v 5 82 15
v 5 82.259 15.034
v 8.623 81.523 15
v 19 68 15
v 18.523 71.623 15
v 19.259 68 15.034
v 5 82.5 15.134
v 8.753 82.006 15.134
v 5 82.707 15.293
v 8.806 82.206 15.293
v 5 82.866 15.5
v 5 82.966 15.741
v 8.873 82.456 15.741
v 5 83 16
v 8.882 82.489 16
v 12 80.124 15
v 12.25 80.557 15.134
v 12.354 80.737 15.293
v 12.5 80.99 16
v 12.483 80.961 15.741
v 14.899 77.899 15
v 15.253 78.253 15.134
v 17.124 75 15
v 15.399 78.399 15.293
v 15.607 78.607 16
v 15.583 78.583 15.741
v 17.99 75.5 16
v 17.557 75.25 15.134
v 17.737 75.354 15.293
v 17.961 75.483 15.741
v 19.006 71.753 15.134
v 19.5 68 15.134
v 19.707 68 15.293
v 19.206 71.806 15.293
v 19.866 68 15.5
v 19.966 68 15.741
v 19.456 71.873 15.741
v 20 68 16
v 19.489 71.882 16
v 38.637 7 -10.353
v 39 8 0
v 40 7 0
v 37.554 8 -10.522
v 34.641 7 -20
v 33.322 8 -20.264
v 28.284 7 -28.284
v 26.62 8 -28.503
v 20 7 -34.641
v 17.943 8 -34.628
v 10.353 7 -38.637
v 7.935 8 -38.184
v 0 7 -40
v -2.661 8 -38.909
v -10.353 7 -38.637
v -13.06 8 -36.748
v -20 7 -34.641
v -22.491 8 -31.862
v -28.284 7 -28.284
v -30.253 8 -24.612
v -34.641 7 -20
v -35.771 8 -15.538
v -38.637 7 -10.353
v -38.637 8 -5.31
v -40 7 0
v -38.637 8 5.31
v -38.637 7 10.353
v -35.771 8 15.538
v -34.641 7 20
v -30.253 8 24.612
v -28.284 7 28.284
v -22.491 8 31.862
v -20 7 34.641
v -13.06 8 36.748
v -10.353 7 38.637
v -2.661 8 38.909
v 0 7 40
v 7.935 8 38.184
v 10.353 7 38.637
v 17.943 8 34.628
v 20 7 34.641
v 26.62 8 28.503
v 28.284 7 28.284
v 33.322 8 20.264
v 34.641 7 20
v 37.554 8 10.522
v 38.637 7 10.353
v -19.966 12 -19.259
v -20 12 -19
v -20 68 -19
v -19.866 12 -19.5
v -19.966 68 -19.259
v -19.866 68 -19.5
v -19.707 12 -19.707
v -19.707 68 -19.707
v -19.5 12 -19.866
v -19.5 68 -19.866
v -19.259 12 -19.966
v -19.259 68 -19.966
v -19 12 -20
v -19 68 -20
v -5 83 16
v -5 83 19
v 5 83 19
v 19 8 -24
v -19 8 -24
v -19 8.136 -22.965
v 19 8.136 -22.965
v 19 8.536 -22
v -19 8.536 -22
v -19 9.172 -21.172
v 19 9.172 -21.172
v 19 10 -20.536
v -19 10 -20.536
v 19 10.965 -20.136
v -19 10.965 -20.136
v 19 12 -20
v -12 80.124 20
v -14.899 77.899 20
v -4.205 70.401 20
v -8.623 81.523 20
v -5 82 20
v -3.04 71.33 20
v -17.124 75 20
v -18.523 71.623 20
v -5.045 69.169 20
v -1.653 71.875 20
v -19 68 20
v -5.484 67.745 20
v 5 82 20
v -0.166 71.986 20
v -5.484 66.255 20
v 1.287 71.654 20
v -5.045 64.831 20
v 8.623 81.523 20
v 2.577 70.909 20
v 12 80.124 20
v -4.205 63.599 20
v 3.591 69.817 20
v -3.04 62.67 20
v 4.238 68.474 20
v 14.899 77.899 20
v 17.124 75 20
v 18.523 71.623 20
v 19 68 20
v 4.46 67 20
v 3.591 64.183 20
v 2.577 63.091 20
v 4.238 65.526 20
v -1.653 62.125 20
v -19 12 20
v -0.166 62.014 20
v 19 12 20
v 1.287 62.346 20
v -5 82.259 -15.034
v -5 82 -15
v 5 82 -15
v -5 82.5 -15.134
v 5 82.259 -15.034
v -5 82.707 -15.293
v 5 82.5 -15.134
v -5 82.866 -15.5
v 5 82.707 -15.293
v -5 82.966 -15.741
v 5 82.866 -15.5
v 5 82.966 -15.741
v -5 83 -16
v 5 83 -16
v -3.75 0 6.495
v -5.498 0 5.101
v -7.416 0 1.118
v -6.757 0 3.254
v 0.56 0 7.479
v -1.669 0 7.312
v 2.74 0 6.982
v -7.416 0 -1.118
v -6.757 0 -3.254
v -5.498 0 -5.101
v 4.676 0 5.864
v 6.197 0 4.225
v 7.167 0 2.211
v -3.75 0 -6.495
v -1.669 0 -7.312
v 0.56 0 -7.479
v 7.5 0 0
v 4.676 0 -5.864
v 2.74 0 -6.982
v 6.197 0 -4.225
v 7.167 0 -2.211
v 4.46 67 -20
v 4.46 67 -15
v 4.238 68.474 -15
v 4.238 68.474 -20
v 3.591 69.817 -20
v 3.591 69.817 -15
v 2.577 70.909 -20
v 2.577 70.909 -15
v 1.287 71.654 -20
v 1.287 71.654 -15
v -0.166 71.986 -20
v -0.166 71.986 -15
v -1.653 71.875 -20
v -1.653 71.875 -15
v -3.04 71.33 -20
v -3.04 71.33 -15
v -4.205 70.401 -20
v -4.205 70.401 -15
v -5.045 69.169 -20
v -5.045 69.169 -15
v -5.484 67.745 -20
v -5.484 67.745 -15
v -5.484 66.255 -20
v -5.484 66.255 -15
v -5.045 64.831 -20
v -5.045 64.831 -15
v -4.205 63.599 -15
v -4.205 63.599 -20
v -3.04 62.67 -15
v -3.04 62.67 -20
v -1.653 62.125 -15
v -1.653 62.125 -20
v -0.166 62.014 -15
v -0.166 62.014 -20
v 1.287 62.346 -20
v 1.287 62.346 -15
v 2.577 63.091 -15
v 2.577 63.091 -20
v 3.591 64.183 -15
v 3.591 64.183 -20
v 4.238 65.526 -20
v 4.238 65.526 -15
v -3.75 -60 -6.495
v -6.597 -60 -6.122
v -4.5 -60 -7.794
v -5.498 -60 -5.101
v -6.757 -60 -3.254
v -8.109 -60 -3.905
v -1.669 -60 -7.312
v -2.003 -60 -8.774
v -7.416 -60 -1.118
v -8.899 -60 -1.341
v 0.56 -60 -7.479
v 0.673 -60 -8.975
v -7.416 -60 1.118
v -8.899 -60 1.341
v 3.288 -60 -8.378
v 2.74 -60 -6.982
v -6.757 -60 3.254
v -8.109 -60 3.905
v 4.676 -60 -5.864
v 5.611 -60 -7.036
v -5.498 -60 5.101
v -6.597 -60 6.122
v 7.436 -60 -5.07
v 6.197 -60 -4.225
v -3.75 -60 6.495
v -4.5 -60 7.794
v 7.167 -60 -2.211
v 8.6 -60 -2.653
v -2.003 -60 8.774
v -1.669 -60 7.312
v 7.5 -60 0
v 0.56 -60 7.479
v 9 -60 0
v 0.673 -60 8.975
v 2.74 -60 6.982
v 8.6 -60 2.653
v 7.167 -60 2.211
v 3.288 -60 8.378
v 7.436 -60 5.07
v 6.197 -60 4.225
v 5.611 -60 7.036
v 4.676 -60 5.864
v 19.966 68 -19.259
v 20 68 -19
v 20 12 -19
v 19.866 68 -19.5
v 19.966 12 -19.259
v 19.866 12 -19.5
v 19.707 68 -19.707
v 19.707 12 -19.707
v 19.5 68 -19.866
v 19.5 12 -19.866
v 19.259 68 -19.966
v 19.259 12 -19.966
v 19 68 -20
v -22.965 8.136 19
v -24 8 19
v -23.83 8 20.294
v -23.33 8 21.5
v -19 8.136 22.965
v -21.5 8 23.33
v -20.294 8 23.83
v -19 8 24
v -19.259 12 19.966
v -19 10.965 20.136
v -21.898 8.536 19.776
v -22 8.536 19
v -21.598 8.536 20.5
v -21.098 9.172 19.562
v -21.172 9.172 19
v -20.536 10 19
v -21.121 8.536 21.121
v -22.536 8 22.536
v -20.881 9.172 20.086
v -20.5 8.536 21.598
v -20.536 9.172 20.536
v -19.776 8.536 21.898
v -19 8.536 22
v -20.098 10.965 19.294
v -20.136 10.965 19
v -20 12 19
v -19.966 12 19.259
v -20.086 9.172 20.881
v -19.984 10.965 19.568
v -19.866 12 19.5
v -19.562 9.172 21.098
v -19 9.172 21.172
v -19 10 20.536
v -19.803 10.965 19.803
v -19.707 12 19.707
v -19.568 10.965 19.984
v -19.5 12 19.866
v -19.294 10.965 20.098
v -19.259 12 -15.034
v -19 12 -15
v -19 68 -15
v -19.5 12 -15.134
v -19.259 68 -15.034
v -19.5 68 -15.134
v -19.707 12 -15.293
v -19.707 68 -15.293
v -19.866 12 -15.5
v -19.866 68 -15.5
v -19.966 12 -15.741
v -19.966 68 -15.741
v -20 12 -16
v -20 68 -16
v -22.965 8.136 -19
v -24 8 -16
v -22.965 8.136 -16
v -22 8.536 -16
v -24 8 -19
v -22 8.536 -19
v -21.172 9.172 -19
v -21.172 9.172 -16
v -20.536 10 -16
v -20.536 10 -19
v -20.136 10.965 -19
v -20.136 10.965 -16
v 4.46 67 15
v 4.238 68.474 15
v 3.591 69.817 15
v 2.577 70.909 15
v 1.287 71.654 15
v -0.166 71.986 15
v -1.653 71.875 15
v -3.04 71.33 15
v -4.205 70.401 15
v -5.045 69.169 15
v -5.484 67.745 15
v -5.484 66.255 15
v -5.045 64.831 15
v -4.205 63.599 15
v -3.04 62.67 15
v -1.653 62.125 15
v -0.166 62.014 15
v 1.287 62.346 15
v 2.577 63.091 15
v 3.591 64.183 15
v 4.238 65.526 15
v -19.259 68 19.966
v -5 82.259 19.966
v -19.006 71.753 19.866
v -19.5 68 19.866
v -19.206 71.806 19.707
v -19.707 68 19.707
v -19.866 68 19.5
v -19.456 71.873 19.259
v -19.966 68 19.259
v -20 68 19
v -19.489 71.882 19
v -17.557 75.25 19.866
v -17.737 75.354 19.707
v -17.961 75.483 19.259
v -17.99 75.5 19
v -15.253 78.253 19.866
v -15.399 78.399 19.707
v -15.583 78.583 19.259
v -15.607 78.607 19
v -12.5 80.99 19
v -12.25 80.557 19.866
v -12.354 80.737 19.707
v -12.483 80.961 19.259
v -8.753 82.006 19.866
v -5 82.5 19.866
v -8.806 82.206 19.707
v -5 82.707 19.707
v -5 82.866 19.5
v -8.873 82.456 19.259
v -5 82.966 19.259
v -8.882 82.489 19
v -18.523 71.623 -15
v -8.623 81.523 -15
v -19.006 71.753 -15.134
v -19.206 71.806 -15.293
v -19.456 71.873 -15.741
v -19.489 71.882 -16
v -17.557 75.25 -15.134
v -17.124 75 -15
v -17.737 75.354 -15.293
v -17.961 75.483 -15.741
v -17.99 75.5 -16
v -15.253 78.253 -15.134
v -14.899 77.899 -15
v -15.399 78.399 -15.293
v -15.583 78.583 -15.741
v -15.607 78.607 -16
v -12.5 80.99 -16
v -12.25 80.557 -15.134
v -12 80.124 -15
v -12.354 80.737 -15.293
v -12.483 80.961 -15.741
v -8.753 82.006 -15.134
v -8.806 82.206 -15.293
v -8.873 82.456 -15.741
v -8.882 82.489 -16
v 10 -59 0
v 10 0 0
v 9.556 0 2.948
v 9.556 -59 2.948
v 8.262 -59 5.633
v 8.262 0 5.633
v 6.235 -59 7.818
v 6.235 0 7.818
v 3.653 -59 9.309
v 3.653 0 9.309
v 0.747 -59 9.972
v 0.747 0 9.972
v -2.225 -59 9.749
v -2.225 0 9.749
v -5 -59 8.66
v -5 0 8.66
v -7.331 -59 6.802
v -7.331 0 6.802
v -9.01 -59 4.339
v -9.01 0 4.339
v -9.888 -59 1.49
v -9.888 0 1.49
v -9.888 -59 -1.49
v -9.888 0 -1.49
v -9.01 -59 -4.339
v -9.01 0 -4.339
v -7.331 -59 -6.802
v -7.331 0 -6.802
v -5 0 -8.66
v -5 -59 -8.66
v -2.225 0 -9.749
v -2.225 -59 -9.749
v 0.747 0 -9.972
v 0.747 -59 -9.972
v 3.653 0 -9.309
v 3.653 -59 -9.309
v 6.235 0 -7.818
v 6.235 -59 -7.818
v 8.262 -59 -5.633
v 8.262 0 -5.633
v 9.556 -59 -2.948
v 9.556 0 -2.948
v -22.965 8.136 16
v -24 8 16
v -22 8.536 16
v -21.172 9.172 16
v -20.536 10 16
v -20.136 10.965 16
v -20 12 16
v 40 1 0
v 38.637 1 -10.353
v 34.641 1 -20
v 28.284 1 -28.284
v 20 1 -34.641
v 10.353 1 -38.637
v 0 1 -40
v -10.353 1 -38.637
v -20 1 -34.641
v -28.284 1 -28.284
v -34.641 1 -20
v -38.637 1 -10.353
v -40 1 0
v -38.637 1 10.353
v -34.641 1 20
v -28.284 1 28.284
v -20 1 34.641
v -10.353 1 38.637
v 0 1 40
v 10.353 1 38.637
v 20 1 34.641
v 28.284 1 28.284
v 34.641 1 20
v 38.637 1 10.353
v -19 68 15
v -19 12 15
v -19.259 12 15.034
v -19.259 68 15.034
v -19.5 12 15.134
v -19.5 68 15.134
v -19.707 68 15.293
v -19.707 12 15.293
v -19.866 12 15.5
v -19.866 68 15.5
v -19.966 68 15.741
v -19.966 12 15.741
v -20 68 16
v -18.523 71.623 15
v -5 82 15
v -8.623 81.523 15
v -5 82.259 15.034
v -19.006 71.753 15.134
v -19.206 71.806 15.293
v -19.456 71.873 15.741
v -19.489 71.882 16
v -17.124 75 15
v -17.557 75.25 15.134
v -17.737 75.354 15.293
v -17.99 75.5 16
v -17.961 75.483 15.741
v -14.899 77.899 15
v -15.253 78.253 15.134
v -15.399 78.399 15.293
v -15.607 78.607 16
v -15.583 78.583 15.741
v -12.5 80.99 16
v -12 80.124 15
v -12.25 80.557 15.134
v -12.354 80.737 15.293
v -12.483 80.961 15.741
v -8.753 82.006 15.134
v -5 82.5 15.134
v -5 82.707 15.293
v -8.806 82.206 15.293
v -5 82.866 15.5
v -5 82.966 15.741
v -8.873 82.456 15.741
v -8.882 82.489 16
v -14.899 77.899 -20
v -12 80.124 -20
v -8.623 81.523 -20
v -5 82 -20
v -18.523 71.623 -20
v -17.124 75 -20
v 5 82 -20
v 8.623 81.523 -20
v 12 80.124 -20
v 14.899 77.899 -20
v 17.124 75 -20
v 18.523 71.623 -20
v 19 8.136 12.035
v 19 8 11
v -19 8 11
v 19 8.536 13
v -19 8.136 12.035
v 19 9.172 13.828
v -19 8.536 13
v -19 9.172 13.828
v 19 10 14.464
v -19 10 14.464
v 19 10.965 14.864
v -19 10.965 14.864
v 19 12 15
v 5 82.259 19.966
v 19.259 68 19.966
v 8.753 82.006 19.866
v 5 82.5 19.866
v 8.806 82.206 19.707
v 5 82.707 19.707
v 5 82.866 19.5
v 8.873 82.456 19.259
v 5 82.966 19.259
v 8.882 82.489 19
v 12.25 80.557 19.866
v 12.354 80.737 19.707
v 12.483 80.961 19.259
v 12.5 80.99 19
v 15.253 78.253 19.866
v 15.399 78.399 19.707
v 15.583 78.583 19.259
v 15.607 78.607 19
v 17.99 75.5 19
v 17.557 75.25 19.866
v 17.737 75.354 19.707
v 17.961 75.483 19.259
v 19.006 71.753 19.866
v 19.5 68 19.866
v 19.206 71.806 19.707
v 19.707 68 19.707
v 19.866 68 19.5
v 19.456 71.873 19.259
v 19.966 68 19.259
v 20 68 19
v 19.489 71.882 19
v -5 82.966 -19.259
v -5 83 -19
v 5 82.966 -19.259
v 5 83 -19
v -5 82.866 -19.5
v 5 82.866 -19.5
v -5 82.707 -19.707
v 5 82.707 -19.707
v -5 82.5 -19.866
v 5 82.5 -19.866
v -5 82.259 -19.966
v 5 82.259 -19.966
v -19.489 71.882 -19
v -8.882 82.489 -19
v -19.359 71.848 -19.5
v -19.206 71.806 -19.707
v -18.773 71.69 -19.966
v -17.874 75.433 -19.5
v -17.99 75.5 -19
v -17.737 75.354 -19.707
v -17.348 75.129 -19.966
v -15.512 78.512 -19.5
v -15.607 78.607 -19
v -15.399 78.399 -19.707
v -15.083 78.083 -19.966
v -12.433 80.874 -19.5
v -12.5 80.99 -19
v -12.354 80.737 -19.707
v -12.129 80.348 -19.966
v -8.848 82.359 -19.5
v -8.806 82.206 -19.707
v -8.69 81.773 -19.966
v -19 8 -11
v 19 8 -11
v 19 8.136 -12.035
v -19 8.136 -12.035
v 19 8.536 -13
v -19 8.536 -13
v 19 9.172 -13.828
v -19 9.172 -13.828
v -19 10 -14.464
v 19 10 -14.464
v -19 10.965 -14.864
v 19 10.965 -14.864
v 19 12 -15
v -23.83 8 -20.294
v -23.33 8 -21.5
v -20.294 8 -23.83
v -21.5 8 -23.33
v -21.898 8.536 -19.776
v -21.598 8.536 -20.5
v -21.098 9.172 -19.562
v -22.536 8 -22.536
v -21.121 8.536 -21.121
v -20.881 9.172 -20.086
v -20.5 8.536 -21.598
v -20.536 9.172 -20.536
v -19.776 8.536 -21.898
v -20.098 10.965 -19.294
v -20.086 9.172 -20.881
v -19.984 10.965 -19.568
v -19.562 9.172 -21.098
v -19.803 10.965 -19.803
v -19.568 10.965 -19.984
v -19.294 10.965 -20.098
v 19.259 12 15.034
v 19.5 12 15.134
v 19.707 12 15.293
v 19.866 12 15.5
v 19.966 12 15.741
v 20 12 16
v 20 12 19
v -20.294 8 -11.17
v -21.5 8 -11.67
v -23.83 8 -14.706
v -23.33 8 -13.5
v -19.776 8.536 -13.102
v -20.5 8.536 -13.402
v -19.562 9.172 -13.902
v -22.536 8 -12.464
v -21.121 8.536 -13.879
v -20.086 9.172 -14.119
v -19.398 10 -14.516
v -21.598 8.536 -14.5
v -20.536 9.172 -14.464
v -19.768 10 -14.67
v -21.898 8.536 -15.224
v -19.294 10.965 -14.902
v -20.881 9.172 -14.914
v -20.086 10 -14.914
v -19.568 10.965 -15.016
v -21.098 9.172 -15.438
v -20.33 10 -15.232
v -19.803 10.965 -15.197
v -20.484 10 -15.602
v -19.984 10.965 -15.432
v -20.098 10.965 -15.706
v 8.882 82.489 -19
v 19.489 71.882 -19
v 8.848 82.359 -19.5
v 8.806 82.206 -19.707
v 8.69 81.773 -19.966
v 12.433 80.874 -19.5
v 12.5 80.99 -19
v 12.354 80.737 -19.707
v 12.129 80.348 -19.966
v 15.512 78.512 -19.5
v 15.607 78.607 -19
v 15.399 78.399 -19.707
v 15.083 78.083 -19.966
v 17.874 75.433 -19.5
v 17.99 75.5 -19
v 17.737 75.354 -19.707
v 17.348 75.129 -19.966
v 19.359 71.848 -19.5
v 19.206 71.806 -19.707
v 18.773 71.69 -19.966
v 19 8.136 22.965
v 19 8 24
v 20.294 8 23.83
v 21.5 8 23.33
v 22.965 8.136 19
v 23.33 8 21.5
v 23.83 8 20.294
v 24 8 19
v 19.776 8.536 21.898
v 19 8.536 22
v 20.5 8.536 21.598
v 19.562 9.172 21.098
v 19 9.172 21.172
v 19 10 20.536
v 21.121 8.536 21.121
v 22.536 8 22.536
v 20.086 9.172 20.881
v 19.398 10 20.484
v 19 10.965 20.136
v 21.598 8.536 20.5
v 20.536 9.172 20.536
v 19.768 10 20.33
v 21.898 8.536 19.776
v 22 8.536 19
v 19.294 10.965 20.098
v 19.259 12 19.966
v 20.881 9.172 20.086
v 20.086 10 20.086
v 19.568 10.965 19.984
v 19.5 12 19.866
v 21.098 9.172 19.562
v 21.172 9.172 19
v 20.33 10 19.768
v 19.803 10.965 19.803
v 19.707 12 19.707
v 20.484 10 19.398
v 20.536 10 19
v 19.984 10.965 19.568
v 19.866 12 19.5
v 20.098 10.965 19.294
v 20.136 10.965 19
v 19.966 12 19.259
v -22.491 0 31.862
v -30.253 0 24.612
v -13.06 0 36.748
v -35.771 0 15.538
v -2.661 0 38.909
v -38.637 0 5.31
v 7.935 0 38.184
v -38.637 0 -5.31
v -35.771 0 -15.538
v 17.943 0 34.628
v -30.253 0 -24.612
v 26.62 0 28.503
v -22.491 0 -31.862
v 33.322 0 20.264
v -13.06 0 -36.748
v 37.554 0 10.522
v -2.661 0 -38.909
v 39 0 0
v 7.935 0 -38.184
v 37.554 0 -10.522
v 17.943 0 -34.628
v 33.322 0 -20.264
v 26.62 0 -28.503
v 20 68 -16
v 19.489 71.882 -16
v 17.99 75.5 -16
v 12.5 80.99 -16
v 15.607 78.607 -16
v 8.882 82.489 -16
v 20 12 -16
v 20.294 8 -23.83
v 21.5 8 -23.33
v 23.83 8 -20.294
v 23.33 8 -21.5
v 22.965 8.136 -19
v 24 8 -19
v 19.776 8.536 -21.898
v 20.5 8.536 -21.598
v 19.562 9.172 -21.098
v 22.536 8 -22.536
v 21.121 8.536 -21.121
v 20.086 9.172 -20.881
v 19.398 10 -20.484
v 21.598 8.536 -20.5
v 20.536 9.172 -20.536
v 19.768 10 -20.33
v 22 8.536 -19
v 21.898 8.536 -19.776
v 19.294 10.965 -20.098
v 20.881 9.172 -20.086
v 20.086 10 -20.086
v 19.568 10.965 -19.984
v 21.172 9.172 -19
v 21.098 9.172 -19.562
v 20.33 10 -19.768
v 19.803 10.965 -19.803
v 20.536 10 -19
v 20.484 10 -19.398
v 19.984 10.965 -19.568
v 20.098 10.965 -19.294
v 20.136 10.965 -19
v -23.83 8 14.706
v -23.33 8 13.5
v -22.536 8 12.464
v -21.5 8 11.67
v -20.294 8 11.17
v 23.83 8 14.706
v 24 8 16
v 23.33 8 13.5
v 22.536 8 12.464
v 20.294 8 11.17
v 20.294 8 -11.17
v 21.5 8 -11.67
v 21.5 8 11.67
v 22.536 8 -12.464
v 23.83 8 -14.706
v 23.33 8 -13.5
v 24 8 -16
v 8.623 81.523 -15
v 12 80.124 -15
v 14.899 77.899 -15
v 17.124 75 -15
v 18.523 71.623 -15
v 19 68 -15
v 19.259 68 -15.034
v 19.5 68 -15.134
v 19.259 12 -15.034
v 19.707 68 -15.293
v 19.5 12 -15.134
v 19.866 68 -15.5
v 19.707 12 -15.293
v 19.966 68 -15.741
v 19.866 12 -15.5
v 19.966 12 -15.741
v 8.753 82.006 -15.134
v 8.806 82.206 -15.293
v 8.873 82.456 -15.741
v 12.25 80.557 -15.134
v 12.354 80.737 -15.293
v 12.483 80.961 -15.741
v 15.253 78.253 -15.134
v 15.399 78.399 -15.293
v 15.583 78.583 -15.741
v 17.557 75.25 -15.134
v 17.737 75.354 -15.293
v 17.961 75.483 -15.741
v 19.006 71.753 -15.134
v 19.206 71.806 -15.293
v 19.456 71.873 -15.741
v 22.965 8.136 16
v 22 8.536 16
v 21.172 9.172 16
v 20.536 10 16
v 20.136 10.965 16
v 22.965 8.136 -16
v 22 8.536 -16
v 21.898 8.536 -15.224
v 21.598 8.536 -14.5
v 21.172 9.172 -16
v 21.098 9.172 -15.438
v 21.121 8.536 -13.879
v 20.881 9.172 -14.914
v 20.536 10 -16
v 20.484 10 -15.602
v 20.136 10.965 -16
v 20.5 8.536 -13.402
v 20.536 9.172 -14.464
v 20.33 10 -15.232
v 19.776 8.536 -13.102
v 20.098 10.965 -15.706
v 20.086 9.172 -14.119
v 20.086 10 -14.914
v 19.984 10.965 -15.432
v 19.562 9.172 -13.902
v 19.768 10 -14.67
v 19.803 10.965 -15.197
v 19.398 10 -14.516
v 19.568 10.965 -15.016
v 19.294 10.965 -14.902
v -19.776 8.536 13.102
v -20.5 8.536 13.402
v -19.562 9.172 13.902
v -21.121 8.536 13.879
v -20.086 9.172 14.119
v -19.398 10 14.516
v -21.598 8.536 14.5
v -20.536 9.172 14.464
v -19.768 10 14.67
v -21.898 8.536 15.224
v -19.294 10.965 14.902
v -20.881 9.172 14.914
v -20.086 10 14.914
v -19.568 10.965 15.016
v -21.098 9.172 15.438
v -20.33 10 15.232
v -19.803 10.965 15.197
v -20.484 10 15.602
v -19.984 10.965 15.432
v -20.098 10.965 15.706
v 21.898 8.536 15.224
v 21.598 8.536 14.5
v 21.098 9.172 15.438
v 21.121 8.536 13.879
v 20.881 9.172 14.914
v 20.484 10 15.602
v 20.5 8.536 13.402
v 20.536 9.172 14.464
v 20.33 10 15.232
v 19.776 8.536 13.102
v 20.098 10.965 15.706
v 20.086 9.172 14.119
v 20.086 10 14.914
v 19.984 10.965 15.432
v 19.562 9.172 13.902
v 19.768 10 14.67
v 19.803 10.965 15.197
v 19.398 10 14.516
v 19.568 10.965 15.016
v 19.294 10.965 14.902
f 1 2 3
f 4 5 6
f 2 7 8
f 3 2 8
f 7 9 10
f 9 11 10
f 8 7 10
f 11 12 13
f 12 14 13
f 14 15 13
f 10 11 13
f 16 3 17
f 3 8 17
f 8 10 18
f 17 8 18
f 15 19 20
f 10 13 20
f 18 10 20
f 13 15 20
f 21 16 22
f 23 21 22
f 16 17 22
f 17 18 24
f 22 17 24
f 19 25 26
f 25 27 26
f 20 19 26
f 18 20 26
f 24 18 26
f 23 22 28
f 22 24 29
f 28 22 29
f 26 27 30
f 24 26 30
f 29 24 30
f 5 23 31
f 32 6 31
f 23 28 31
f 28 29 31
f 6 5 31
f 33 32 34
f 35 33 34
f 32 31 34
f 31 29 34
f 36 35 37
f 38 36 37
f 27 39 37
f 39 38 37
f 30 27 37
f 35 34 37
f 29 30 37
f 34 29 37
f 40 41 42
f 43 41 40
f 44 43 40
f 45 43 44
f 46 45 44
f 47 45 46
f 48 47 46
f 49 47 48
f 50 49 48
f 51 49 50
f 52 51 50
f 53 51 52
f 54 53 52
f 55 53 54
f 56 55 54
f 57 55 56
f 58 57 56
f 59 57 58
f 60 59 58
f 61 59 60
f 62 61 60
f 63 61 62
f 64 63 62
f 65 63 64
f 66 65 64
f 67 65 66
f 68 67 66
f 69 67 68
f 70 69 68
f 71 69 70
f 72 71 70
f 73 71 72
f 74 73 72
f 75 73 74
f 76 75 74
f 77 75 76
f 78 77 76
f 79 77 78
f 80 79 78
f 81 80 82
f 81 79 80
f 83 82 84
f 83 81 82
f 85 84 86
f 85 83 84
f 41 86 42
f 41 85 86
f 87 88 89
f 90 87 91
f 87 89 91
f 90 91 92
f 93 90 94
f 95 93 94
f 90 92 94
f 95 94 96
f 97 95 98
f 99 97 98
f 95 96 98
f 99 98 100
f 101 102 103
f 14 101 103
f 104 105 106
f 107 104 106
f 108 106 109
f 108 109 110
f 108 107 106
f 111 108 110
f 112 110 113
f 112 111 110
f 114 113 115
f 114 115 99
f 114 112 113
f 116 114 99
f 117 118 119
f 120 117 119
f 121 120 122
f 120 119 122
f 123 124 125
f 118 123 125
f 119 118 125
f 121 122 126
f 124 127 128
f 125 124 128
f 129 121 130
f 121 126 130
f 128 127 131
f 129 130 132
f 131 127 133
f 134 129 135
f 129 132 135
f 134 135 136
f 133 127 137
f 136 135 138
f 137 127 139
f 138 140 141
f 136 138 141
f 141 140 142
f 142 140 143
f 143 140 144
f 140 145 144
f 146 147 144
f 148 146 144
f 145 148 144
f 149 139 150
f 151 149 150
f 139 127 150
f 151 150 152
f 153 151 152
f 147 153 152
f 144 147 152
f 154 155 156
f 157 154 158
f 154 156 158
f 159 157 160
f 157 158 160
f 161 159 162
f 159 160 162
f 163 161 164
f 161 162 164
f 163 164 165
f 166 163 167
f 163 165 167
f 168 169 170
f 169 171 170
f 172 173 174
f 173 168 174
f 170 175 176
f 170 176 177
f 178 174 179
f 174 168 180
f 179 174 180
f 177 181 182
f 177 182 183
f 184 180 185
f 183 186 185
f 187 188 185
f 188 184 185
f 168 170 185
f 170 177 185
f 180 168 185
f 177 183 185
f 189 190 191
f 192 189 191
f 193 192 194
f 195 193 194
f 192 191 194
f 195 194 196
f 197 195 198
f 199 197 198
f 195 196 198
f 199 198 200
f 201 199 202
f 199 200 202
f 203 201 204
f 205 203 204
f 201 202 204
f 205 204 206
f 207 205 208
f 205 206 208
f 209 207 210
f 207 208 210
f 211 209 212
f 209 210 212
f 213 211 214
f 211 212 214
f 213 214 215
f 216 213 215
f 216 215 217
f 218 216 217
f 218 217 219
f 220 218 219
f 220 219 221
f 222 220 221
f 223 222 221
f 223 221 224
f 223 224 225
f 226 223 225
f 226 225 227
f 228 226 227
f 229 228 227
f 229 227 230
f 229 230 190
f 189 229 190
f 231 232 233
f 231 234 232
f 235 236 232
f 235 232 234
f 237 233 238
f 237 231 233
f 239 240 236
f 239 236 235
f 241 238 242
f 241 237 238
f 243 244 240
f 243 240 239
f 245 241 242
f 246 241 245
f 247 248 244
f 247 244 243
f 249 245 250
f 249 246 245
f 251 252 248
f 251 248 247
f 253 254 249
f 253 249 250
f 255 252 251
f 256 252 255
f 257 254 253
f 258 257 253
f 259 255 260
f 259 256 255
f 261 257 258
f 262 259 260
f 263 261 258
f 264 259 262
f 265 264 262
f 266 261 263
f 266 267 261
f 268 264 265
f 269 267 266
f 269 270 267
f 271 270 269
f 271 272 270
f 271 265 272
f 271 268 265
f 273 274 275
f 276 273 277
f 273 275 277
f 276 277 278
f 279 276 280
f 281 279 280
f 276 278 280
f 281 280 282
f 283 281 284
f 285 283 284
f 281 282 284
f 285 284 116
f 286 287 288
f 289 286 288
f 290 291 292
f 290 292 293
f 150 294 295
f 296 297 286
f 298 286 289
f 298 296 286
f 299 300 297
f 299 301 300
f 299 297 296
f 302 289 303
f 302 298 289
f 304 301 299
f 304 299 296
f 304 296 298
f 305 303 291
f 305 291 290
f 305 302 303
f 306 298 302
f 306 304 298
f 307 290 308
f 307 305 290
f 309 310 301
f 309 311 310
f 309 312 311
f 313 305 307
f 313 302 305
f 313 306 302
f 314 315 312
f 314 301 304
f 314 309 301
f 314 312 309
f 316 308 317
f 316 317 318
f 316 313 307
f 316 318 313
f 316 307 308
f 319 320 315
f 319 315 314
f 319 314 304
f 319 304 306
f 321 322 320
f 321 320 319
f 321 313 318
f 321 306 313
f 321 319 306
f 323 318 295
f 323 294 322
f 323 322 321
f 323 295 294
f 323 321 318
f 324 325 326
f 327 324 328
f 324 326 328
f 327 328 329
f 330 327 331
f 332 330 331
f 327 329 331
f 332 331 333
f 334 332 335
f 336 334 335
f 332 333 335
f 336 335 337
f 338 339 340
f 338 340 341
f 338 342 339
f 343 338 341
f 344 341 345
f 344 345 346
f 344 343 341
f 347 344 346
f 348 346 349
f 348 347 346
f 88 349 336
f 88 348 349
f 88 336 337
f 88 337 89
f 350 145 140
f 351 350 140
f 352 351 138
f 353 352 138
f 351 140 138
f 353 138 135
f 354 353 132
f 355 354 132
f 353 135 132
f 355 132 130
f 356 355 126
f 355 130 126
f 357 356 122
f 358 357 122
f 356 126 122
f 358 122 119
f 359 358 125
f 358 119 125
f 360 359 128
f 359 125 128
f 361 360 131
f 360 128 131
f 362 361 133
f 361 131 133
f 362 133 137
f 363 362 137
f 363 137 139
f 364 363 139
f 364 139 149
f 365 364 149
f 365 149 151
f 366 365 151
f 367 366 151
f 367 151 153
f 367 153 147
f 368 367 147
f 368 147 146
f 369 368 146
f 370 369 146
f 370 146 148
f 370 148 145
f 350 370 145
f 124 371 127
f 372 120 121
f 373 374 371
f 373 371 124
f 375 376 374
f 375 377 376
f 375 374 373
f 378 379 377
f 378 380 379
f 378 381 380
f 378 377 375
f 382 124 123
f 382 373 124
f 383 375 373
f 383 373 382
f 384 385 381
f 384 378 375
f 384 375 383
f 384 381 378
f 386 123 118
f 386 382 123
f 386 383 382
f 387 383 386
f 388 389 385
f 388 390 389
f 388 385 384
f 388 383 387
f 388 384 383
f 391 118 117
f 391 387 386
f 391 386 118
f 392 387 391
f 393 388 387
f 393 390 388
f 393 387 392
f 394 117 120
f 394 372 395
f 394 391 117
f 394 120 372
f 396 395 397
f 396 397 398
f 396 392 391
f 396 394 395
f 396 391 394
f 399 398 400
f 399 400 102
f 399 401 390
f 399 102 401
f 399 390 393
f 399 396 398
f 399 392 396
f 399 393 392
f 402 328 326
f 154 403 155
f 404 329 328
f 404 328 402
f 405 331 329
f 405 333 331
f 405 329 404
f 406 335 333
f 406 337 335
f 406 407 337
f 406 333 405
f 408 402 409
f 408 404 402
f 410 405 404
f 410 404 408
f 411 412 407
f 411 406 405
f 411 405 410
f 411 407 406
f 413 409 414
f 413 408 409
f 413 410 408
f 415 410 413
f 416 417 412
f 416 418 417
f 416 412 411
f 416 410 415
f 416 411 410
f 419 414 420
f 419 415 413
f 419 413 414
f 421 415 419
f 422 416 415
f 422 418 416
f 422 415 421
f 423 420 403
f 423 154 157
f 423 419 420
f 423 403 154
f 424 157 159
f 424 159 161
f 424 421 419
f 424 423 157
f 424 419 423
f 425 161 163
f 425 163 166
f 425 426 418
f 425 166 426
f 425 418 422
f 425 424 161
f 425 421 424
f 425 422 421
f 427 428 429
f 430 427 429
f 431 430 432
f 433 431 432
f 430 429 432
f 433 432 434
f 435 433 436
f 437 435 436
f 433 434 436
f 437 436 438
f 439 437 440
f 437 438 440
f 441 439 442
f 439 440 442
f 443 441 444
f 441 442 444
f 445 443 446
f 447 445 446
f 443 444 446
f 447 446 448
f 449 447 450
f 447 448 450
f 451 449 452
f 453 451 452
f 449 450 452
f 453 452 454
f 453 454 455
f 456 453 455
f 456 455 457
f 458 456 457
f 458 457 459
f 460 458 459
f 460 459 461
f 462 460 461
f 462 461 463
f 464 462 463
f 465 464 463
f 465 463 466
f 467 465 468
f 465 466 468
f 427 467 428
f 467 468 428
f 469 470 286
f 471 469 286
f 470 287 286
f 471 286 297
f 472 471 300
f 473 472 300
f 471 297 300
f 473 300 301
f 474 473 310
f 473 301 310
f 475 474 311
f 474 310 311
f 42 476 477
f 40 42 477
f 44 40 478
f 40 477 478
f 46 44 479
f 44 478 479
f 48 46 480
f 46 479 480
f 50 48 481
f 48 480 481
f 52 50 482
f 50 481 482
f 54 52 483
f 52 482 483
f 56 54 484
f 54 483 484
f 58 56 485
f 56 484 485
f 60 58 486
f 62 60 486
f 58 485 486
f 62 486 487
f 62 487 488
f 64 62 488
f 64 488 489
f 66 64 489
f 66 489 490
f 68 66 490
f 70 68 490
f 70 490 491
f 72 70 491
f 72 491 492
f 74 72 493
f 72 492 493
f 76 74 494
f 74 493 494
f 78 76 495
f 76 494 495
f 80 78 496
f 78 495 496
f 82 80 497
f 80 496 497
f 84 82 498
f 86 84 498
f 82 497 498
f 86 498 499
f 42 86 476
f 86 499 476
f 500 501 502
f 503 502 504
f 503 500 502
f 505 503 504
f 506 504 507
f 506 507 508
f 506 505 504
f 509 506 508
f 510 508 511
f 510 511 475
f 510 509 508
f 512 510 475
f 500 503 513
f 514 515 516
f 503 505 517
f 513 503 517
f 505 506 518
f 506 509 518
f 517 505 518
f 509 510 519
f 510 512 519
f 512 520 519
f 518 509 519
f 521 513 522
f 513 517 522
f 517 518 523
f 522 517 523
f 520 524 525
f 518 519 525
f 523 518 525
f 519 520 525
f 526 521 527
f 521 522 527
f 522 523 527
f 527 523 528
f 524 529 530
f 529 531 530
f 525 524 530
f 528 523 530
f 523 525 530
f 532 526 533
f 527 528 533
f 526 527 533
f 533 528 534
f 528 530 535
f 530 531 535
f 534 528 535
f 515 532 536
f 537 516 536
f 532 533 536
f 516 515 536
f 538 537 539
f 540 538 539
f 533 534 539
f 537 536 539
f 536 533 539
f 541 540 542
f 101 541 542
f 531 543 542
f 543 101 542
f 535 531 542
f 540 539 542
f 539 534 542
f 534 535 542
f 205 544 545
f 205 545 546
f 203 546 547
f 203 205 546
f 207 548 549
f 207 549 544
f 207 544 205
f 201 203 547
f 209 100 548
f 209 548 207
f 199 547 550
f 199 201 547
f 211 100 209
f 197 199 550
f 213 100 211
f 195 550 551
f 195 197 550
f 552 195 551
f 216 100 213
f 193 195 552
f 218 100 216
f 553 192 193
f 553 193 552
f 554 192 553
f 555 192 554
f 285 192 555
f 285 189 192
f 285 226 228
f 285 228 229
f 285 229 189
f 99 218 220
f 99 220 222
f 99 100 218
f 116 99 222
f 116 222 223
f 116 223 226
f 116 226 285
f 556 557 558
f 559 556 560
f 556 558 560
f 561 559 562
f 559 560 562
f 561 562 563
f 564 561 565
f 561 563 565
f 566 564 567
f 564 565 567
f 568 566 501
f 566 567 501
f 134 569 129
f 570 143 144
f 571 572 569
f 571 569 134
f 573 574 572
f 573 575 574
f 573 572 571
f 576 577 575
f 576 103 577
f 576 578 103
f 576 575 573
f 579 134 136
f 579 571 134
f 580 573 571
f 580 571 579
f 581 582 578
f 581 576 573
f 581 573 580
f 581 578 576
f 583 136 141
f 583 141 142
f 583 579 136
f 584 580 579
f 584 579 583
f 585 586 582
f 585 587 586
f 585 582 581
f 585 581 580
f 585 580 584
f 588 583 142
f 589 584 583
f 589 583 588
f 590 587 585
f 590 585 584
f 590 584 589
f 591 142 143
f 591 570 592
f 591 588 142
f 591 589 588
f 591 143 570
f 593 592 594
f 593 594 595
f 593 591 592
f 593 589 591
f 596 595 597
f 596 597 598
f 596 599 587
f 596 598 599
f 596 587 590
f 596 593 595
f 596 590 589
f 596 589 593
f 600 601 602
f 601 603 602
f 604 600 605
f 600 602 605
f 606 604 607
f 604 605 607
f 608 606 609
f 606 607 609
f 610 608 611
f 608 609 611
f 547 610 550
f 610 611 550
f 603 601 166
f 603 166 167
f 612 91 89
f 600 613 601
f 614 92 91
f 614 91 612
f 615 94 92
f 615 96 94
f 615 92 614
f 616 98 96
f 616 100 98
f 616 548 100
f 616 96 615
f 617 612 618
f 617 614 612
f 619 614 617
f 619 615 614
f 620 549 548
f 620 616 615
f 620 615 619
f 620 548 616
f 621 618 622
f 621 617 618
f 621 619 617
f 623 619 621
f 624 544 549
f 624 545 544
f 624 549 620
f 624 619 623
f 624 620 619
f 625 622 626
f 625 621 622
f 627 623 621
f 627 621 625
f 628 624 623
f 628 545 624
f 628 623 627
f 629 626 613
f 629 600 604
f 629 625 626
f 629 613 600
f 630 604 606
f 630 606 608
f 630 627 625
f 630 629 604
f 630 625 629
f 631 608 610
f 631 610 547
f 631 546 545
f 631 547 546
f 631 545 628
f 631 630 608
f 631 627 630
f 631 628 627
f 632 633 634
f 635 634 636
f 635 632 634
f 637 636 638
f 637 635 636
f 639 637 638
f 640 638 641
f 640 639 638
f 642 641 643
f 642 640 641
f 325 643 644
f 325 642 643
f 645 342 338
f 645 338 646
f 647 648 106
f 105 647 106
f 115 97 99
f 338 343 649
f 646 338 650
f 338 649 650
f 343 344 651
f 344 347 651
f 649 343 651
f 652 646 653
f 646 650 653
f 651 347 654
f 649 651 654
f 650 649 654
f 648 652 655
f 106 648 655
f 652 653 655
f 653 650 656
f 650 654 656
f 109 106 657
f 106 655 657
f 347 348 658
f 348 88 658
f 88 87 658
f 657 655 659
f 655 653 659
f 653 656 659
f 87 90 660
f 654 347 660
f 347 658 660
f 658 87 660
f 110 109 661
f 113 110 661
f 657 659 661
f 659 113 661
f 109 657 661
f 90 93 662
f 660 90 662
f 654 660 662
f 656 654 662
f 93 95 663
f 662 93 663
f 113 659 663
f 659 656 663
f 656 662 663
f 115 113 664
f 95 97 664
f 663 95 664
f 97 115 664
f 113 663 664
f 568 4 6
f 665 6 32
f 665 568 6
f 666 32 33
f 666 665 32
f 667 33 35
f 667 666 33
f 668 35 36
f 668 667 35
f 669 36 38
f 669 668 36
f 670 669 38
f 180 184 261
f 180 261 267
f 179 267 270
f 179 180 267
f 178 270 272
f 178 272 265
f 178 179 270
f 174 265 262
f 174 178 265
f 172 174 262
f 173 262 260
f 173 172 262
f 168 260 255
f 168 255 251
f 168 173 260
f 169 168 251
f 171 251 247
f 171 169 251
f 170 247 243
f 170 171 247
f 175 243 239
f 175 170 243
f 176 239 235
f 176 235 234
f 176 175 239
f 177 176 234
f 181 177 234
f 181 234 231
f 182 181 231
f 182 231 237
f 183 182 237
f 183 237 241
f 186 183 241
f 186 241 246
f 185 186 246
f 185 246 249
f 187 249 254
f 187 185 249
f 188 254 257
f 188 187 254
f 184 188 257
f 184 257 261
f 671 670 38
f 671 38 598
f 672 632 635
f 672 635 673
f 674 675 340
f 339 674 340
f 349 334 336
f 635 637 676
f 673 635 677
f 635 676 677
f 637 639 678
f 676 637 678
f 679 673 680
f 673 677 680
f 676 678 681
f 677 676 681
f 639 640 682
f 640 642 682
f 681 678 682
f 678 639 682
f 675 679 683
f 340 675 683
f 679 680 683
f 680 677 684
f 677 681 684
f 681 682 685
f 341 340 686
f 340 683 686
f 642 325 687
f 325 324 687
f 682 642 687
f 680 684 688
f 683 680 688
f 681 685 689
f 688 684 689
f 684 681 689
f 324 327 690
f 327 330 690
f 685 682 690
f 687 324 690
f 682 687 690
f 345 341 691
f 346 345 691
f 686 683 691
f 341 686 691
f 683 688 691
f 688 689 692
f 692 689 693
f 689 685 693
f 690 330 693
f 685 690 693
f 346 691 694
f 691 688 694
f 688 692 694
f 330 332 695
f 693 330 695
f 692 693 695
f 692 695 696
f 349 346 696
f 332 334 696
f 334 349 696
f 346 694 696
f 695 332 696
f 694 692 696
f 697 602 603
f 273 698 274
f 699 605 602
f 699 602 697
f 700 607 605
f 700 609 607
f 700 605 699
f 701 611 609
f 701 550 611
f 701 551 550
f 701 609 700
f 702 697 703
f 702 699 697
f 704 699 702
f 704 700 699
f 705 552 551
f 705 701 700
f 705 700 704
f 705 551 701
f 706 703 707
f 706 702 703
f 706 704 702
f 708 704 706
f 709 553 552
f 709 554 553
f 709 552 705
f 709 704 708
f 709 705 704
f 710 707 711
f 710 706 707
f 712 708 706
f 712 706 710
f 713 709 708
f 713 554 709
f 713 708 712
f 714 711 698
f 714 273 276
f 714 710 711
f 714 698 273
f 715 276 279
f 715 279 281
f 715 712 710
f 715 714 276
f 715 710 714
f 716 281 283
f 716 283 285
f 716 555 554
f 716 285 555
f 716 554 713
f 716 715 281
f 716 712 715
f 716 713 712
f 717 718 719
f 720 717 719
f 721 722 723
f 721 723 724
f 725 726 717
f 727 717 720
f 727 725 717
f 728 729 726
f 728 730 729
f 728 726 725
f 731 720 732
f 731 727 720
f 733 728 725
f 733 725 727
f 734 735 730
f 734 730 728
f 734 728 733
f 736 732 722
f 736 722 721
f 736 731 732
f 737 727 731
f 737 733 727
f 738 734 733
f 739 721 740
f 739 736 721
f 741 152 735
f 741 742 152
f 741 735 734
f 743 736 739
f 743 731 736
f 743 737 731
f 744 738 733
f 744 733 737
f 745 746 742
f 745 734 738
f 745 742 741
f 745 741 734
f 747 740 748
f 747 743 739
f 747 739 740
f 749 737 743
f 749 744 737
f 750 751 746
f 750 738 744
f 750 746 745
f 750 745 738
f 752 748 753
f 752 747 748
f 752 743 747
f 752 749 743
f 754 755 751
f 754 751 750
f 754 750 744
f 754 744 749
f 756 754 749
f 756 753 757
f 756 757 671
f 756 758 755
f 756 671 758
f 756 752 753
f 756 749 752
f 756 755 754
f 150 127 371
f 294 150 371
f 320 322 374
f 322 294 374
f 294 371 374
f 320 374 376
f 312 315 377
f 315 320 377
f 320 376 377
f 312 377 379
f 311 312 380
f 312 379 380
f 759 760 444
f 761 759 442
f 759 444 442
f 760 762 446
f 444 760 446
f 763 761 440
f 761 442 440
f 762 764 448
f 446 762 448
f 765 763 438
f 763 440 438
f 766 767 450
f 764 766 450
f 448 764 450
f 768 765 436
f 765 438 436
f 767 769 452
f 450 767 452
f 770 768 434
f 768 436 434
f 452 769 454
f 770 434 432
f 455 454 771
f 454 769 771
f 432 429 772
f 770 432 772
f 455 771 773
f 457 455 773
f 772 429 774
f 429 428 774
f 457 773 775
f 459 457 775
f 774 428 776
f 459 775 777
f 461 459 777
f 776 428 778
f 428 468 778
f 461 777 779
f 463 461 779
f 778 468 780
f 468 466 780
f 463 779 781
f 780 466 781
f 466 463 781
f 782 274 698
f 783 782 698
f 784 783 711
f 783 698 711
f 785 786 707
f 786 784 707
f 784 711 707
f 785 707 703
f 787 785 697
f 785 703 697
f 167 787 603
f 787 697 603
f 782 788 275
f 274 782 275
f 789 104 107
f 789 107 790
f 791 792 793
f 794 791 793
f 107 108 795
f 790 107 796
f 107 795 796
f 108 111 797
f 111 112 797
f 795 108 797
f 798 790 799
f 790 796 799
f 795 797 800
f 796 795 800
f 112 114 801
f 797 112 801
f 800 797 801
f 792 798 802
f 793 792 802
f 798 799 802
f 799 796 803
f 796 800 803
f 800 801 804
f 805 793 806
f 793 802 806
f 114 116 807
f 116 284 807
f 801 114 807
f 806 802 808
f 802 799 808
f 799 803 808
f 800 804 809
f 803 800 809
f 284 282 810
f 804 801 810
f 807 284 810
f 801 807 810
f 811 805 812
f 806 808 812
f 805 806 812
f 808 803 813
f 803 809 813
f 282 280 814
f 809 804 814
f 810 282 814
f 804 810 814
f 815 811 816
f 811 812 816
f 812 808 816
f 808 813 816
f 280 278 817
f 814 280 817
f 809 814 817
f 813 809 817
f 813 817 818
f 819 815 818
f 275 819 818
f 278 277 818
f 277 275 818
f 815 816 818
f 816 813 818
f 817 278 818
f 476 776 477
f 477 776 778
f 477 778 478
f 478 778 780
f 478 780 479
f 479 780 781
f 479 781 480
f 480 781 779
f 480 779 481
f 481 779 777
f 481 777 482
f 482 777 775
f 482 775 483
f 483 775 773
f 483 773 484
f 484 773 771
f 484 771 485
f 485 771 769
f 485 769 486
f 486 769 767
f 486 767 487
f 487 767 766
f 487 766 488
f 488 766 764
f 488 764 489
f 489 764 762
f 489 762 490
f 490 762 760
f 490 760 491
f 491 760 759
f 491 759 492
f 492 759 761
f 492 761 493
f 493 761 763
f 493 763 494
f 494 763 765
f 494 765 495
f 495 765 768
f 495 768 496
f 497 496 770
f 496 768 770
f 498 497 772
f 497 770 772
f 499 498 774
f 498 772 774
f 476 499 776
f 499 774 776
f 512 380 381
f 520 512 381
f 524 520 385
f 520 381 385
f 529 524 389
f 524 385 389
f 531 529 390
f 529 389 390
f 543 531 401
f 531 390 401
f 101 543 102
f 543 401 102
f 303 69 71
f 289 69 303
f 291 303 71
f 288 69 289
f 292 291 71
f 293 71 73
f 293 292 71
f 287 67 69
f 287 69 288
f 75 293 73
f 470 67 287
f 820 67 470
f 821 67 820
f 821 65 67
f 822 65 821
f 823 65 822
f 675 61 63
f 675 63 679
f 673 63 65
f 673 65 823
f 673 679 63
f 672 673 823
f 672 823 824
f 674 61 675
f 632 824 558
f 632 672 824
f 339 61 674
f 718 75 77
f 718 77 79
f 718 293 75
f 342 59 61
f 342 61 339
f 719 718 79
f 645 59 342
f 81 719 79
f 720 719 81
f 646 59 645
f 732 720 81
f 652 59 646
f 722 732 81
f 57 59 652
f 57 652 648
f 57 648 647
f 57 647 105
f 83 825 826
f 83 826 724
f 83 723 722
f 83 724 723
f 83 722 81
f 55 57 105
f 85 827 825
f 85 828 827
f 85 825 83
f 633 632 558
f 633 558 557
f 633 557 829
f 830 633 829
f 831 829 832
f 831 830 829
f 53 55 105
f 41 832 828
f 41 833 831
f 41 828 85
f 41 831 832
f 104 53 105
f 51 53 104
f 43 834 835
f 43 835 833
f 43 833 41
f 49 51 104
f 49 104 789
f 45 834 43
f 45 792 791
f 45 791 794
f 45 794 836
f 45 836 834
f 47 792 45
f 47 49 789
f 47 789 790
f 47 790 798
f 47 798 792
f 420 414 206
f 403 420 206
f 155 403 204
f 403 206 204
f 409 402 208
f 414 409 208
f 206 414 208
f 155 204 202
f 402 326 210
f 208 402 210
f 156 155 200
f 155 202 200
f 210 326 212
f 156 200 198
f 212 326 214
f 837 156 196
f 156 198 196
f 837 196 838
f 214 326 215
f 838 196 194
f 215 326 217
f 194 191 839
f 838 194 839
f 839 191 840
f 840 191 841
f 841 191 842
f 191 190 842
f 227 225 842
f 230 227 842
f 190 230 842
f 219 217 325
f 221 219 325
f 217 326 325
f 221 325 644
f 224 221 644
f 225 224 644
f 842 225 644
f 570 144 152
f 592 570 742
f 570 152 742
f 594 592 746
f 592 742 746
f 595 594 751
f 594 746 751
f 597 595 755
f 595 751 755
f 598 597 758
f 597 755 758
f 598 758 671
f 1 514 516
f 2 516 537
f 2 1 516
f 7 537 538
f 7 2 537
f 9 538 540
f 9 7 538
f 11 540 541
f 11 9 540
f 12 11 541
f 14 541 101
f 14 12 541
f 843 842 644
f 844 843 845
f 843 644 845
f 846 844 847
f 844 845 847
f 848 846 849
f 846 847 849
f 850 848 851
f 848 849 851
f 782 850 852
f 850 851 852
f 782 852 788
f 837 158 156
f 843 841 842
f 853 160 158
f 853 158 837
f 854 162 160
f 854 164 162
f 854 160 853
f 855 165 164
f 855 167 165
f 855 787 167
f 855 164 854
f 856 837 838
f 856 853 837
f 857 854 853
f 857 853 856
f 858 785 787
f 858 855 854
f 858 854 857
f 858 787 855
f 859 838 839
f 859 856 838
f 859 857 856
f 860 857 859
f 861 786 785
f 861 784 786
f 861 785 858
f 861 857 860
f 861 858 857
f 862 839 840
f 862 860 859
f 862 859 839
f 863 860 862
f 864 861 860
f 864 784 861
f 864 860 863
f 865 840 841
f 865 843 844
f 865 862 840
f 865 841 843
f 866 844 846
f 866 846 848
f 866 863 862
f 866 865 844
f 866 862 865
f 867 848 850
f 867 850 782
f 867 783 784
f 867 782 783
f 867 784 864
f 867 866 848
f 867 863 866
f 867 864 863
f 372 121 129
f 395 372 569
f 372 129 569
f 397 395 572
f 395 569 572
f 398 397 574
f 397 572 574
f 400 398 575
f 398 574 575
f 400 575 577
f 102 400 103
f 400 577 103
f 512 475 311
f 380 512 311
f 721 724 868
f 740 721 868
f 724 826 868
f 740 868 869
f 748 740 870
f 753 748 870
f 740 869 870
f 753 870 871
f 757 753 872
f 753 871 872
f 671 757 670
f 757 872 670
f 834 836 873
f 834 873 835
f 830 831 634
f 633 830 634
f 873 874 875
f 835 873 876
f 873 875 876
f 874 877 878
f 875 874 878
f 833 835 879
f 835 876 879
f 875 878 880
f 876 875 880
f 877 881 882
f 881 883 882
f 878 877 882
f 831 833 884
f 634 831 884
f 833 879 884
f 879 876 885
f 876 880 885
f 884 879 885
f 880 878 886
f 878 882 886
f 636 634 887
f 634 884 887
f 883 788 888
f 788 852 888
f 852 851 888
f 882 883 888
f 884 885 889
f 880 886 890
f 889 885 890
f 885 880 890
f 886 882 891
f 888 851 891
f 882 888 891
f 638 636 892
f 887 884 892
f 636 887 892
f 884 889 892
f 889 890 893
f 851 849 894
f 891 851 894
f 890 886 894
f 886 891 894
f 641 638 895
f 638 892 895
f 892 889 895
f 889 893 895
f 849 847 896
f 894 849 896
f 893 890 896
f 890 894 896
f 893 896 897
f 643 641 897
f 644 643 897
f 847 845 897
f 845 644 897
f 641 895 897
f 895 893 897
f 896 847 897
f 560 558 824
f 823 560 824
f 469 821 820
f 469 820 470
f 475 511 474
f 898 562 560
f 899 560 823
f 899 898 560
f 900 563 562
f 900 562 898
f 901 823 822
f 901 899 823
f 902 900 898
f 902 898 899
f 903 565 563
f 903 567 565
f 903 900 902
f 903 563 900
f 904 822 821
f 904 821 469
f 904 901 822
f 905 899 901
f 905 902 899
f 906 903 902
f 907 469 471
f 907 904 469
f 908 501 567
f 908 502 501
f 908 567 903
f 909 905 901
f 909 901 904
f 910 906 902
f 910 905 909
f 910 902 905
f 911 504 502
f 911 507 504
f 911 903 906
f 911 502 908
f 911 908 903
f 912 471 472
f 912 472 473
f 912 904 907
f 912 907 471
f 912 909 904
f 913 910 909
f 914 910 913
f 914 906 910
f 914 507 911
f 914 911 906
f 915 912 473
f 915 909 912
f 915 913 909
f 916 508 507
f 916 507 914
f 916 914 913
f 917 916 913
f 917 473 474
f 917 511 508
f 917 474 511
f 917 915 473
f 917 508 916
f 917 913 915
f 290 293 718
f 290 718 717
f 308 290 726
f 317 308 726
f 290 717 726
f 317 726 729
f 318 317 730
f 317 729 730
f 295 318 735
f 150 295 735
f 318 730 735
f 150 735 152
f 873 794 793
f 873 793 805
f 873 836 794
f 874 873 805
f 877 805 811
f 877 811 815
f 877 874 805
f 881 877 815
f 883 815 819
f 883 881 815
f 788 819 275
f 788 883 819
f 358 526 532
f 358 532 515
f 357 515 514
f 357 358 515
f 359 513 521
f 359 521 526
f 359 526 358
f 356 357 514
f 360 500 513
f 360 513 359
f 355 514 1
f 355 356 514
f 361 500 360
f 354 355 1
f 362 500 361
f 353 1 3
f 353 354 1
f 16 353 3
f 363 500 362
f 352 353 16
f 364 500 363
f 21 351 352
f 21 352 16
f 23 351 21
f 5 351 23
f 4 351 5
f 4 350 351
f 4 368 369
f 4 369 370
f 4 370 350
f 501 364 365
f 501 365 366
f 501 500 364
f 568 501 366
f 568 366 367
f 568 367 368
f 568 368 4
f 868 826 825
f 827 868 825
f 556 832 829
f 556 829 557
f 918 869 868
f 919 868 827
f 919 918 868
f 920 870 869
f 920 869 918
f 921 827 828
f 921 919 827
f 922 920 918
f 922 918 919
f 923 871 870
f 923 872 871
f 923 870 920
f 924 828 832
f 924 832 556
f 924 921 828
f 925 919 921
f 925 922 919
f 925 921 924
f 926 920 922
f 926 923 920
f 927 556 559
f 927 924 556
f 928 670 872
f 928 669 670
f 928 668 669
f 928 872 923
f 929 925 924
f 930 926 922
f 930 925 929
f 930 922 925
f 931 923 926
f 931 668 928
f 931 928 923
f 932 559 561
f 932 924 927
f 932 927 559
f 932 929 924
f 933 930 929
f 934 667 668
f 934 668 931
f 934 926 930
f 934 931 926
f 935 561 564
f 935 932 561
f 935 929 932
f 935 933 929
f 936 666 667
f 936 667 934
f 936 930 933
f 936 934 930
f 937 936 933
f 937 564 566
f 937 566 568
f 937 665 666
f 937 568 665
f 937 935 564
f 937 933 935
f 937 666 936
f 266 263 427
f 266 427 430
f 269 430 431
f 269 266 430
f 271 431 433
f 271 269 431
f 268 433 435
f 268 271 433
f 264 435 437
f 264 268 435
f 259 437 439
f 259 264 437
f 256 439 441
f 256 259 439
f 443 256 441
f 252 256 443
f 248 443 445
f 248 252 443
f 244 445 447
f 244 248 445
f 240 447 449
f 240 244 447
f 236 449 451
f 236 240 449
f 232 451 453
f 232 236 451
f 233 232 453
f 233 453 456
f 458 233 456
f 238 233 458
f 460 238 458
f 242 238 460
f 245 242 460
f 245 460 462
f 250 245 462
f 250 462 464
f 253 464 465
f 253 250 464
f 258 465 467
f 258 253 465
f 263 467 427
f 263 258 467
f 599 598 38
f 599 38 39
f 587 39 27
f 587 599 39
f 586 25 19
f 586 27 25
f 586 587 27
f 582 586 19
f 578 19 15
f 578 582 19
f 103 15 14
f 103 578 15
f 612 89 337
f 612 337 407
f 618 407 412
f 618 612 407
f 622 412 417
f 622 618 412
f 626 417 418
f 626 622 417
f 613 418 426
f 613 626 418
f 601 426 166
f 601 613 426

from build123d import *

# Parameters (mm, degrees)
SKETCH2_R            = 40
BOSS_EXTRUDE1_DEPTH  = 8
SKETCH6_R            = 10
SKETCH6_R_2          = 7.5
BOSS_EXTRUDE4_DEPTH  = 60
CHAMFER1_SIZE        = 1
SKETCH19_W           = 40
SKETCH19_H           = 5
BOSS_EXTRUDE5_DEPTH  = 75
FILLET1_R            = 15
FILLET2_R            = 1
FILLET3_R            = 4
FILLET1_OF_MIRROR2_R = 15
FILLET2_OF_MIRROR2_R = 1
FILLET3_OF_MIRROR2_R = 4
SKETCH21_R           = 5
CUT_EXTRUDE1_DEPTH   = 40


with BuildPart() as part:
    # Sketch2 → Boss-Extrude1 (new body)
    with BuildSketch(Plane(origin=(0, 0, 0), x_dir=(1, 0, 0), z_dir=(0, 1, 0))):
        Circle(SKETCH2_R)
    extrude(amount=BOSS_EXTRUDE1_DEPTH)

    # Sketch6 → Boss-Extrude4 (add)
    with BuildSketch(Plane.XZ):
        Circle(SKETCH6_R)
        Circle(SKETCH6_R_2, mode=Mode.SUBTRACT)
    extrude(amount=BOSS_EXTRUDE4_DEPTH)

    # Chamfer1
    chamfer1_edges = [part.edges().sort_by_distance(p)[0] for p in [
        (-40, 0, 0),
        (-40, 8, 0),
        (-10, -60, 0),
    ]]
    chamfer(chamfer1_edges, length=CHAMFER1_SIZE)

    # Sketch19 → Boss-Extrude5 (add)
    with BuildSketch(Plane(origin=(0, 8, 0), x_dir=(1, 0, 0), z_dir=(0, 1, 0))):
        with Locations((0, 17.5)):
            Rectangle(SKETCH19_W, SKETCH19_H)
    boss_extrude5 = extrude(amount=BOSS_EXTRUDE5_DEPTH)

    # Fillet1
    fillet1_edges = [part.edges().sort_by_distance(p)[0] for p in [
        (-20, 83, -17.5),
        (20, 83, -17.5),
    ]]
    fillet(fillet1_edges, radius=FILLET1_R)

    # Fillet2
    fillet2_edges = [part.edges().sort_by_distance(p)[0] for p in [
        (0, 83, -15),
        (0, 83, -20),
        (-20, 38, -20),
        (20, 38, -20),
        (-15.606601718, 78.606601718, -20),
        (15.606601718, 78.606601718, -20),
        (20, 38, -15),
        (-20, 38, -15),
        (-15.606601718, 78.606601718, -15),
        (15.606601718, 78.606601718, -15),
    ]]
    fillet(fillet2_edges, radius=FILLET2_R)

    # Fillet3
    fillet3_edges = [part.edges().sort_by_distance(p)[0] for p in [
        (0, 8, -20),
        (20, 8, -17.5),
        (0, 8, -15),
        (-20, 8, -17.5),
        (19.707106781, 8, -19.707106781),
        (19.707106781, 8, -15.292893219),
        (-19.707106781, 8, -19.707106781),
        (-19.707106781, 8, -15.292893219),
    ]]
    fillet(fillet3_edges, radius=FILLET3_R)

    # Mirror2: Boss-Extrude5 across plane
    add(boss_extrude5.mirror(Plane.XY))

    # Fillet1 of Mirror2
    fillet1_of_mirror2_edges = [part.edges().sort_by_distance(p)[0] for p in [
        (-20, 83, 17.5),
        (20, 83, 17.5),
    ]]
    fillet(fillet1_of_mirror2_edges, radius=FILLET1_OF_MIRROR2_R)

    # Fillet2 of Mirror2
    fillet2_of_mirror2_edges = [part.edges().sort_by_distance(p)[0] for p in [
        (0, 83, 15),
        (0, 83, 20),
        (-20, 38, 20),
        (20, 38, 20),
        (-15.606601718, 78.606601718, 20),
        (15.606601718, 78.606601718, 20),
        (20, 38, 15),
        (-20, 38, 15),
        (-15.606601718, 78.606601718, 15),
        (15.606601718, 78.606601718, 15),
    ]]
    fillet(fillet2_of_mirror2_edges, radius=FILLET2_OF_MIRROR2_R)

    # Fillet3 of Mirror2
    fillet3_of_mirror2_edges = [part.edges().sort_by_distance(p)[0] for p in [
        (0, 8, 20),
        (20, 8, 17.5),
        (0, 8, 15),
        (-20, 8, 17.5),
        (19.707106781, 8, 19.707106781),
        (19.707106781, 8, 15.292893219),
        (-19.707106781, 8, 19.707106781),
        (-19.707106781, 8, 15.292893219),
    ]]
    fillet(fillet3_of_mirror2_edges, radius=FILLET3_OF_MIRROR2_R)

    # Sketch21 → Cut-Extrude1 (cut)
    with BuildSketch(Plane.XY.offset(20)):
        with Locations((-0.54, 67)):
            Circle(SKETCH21_R)
    extrude(amount=-CUT_EXTRUDE1_DEPTH, mode=Mode.SUBTRACT)


solid = part.part
